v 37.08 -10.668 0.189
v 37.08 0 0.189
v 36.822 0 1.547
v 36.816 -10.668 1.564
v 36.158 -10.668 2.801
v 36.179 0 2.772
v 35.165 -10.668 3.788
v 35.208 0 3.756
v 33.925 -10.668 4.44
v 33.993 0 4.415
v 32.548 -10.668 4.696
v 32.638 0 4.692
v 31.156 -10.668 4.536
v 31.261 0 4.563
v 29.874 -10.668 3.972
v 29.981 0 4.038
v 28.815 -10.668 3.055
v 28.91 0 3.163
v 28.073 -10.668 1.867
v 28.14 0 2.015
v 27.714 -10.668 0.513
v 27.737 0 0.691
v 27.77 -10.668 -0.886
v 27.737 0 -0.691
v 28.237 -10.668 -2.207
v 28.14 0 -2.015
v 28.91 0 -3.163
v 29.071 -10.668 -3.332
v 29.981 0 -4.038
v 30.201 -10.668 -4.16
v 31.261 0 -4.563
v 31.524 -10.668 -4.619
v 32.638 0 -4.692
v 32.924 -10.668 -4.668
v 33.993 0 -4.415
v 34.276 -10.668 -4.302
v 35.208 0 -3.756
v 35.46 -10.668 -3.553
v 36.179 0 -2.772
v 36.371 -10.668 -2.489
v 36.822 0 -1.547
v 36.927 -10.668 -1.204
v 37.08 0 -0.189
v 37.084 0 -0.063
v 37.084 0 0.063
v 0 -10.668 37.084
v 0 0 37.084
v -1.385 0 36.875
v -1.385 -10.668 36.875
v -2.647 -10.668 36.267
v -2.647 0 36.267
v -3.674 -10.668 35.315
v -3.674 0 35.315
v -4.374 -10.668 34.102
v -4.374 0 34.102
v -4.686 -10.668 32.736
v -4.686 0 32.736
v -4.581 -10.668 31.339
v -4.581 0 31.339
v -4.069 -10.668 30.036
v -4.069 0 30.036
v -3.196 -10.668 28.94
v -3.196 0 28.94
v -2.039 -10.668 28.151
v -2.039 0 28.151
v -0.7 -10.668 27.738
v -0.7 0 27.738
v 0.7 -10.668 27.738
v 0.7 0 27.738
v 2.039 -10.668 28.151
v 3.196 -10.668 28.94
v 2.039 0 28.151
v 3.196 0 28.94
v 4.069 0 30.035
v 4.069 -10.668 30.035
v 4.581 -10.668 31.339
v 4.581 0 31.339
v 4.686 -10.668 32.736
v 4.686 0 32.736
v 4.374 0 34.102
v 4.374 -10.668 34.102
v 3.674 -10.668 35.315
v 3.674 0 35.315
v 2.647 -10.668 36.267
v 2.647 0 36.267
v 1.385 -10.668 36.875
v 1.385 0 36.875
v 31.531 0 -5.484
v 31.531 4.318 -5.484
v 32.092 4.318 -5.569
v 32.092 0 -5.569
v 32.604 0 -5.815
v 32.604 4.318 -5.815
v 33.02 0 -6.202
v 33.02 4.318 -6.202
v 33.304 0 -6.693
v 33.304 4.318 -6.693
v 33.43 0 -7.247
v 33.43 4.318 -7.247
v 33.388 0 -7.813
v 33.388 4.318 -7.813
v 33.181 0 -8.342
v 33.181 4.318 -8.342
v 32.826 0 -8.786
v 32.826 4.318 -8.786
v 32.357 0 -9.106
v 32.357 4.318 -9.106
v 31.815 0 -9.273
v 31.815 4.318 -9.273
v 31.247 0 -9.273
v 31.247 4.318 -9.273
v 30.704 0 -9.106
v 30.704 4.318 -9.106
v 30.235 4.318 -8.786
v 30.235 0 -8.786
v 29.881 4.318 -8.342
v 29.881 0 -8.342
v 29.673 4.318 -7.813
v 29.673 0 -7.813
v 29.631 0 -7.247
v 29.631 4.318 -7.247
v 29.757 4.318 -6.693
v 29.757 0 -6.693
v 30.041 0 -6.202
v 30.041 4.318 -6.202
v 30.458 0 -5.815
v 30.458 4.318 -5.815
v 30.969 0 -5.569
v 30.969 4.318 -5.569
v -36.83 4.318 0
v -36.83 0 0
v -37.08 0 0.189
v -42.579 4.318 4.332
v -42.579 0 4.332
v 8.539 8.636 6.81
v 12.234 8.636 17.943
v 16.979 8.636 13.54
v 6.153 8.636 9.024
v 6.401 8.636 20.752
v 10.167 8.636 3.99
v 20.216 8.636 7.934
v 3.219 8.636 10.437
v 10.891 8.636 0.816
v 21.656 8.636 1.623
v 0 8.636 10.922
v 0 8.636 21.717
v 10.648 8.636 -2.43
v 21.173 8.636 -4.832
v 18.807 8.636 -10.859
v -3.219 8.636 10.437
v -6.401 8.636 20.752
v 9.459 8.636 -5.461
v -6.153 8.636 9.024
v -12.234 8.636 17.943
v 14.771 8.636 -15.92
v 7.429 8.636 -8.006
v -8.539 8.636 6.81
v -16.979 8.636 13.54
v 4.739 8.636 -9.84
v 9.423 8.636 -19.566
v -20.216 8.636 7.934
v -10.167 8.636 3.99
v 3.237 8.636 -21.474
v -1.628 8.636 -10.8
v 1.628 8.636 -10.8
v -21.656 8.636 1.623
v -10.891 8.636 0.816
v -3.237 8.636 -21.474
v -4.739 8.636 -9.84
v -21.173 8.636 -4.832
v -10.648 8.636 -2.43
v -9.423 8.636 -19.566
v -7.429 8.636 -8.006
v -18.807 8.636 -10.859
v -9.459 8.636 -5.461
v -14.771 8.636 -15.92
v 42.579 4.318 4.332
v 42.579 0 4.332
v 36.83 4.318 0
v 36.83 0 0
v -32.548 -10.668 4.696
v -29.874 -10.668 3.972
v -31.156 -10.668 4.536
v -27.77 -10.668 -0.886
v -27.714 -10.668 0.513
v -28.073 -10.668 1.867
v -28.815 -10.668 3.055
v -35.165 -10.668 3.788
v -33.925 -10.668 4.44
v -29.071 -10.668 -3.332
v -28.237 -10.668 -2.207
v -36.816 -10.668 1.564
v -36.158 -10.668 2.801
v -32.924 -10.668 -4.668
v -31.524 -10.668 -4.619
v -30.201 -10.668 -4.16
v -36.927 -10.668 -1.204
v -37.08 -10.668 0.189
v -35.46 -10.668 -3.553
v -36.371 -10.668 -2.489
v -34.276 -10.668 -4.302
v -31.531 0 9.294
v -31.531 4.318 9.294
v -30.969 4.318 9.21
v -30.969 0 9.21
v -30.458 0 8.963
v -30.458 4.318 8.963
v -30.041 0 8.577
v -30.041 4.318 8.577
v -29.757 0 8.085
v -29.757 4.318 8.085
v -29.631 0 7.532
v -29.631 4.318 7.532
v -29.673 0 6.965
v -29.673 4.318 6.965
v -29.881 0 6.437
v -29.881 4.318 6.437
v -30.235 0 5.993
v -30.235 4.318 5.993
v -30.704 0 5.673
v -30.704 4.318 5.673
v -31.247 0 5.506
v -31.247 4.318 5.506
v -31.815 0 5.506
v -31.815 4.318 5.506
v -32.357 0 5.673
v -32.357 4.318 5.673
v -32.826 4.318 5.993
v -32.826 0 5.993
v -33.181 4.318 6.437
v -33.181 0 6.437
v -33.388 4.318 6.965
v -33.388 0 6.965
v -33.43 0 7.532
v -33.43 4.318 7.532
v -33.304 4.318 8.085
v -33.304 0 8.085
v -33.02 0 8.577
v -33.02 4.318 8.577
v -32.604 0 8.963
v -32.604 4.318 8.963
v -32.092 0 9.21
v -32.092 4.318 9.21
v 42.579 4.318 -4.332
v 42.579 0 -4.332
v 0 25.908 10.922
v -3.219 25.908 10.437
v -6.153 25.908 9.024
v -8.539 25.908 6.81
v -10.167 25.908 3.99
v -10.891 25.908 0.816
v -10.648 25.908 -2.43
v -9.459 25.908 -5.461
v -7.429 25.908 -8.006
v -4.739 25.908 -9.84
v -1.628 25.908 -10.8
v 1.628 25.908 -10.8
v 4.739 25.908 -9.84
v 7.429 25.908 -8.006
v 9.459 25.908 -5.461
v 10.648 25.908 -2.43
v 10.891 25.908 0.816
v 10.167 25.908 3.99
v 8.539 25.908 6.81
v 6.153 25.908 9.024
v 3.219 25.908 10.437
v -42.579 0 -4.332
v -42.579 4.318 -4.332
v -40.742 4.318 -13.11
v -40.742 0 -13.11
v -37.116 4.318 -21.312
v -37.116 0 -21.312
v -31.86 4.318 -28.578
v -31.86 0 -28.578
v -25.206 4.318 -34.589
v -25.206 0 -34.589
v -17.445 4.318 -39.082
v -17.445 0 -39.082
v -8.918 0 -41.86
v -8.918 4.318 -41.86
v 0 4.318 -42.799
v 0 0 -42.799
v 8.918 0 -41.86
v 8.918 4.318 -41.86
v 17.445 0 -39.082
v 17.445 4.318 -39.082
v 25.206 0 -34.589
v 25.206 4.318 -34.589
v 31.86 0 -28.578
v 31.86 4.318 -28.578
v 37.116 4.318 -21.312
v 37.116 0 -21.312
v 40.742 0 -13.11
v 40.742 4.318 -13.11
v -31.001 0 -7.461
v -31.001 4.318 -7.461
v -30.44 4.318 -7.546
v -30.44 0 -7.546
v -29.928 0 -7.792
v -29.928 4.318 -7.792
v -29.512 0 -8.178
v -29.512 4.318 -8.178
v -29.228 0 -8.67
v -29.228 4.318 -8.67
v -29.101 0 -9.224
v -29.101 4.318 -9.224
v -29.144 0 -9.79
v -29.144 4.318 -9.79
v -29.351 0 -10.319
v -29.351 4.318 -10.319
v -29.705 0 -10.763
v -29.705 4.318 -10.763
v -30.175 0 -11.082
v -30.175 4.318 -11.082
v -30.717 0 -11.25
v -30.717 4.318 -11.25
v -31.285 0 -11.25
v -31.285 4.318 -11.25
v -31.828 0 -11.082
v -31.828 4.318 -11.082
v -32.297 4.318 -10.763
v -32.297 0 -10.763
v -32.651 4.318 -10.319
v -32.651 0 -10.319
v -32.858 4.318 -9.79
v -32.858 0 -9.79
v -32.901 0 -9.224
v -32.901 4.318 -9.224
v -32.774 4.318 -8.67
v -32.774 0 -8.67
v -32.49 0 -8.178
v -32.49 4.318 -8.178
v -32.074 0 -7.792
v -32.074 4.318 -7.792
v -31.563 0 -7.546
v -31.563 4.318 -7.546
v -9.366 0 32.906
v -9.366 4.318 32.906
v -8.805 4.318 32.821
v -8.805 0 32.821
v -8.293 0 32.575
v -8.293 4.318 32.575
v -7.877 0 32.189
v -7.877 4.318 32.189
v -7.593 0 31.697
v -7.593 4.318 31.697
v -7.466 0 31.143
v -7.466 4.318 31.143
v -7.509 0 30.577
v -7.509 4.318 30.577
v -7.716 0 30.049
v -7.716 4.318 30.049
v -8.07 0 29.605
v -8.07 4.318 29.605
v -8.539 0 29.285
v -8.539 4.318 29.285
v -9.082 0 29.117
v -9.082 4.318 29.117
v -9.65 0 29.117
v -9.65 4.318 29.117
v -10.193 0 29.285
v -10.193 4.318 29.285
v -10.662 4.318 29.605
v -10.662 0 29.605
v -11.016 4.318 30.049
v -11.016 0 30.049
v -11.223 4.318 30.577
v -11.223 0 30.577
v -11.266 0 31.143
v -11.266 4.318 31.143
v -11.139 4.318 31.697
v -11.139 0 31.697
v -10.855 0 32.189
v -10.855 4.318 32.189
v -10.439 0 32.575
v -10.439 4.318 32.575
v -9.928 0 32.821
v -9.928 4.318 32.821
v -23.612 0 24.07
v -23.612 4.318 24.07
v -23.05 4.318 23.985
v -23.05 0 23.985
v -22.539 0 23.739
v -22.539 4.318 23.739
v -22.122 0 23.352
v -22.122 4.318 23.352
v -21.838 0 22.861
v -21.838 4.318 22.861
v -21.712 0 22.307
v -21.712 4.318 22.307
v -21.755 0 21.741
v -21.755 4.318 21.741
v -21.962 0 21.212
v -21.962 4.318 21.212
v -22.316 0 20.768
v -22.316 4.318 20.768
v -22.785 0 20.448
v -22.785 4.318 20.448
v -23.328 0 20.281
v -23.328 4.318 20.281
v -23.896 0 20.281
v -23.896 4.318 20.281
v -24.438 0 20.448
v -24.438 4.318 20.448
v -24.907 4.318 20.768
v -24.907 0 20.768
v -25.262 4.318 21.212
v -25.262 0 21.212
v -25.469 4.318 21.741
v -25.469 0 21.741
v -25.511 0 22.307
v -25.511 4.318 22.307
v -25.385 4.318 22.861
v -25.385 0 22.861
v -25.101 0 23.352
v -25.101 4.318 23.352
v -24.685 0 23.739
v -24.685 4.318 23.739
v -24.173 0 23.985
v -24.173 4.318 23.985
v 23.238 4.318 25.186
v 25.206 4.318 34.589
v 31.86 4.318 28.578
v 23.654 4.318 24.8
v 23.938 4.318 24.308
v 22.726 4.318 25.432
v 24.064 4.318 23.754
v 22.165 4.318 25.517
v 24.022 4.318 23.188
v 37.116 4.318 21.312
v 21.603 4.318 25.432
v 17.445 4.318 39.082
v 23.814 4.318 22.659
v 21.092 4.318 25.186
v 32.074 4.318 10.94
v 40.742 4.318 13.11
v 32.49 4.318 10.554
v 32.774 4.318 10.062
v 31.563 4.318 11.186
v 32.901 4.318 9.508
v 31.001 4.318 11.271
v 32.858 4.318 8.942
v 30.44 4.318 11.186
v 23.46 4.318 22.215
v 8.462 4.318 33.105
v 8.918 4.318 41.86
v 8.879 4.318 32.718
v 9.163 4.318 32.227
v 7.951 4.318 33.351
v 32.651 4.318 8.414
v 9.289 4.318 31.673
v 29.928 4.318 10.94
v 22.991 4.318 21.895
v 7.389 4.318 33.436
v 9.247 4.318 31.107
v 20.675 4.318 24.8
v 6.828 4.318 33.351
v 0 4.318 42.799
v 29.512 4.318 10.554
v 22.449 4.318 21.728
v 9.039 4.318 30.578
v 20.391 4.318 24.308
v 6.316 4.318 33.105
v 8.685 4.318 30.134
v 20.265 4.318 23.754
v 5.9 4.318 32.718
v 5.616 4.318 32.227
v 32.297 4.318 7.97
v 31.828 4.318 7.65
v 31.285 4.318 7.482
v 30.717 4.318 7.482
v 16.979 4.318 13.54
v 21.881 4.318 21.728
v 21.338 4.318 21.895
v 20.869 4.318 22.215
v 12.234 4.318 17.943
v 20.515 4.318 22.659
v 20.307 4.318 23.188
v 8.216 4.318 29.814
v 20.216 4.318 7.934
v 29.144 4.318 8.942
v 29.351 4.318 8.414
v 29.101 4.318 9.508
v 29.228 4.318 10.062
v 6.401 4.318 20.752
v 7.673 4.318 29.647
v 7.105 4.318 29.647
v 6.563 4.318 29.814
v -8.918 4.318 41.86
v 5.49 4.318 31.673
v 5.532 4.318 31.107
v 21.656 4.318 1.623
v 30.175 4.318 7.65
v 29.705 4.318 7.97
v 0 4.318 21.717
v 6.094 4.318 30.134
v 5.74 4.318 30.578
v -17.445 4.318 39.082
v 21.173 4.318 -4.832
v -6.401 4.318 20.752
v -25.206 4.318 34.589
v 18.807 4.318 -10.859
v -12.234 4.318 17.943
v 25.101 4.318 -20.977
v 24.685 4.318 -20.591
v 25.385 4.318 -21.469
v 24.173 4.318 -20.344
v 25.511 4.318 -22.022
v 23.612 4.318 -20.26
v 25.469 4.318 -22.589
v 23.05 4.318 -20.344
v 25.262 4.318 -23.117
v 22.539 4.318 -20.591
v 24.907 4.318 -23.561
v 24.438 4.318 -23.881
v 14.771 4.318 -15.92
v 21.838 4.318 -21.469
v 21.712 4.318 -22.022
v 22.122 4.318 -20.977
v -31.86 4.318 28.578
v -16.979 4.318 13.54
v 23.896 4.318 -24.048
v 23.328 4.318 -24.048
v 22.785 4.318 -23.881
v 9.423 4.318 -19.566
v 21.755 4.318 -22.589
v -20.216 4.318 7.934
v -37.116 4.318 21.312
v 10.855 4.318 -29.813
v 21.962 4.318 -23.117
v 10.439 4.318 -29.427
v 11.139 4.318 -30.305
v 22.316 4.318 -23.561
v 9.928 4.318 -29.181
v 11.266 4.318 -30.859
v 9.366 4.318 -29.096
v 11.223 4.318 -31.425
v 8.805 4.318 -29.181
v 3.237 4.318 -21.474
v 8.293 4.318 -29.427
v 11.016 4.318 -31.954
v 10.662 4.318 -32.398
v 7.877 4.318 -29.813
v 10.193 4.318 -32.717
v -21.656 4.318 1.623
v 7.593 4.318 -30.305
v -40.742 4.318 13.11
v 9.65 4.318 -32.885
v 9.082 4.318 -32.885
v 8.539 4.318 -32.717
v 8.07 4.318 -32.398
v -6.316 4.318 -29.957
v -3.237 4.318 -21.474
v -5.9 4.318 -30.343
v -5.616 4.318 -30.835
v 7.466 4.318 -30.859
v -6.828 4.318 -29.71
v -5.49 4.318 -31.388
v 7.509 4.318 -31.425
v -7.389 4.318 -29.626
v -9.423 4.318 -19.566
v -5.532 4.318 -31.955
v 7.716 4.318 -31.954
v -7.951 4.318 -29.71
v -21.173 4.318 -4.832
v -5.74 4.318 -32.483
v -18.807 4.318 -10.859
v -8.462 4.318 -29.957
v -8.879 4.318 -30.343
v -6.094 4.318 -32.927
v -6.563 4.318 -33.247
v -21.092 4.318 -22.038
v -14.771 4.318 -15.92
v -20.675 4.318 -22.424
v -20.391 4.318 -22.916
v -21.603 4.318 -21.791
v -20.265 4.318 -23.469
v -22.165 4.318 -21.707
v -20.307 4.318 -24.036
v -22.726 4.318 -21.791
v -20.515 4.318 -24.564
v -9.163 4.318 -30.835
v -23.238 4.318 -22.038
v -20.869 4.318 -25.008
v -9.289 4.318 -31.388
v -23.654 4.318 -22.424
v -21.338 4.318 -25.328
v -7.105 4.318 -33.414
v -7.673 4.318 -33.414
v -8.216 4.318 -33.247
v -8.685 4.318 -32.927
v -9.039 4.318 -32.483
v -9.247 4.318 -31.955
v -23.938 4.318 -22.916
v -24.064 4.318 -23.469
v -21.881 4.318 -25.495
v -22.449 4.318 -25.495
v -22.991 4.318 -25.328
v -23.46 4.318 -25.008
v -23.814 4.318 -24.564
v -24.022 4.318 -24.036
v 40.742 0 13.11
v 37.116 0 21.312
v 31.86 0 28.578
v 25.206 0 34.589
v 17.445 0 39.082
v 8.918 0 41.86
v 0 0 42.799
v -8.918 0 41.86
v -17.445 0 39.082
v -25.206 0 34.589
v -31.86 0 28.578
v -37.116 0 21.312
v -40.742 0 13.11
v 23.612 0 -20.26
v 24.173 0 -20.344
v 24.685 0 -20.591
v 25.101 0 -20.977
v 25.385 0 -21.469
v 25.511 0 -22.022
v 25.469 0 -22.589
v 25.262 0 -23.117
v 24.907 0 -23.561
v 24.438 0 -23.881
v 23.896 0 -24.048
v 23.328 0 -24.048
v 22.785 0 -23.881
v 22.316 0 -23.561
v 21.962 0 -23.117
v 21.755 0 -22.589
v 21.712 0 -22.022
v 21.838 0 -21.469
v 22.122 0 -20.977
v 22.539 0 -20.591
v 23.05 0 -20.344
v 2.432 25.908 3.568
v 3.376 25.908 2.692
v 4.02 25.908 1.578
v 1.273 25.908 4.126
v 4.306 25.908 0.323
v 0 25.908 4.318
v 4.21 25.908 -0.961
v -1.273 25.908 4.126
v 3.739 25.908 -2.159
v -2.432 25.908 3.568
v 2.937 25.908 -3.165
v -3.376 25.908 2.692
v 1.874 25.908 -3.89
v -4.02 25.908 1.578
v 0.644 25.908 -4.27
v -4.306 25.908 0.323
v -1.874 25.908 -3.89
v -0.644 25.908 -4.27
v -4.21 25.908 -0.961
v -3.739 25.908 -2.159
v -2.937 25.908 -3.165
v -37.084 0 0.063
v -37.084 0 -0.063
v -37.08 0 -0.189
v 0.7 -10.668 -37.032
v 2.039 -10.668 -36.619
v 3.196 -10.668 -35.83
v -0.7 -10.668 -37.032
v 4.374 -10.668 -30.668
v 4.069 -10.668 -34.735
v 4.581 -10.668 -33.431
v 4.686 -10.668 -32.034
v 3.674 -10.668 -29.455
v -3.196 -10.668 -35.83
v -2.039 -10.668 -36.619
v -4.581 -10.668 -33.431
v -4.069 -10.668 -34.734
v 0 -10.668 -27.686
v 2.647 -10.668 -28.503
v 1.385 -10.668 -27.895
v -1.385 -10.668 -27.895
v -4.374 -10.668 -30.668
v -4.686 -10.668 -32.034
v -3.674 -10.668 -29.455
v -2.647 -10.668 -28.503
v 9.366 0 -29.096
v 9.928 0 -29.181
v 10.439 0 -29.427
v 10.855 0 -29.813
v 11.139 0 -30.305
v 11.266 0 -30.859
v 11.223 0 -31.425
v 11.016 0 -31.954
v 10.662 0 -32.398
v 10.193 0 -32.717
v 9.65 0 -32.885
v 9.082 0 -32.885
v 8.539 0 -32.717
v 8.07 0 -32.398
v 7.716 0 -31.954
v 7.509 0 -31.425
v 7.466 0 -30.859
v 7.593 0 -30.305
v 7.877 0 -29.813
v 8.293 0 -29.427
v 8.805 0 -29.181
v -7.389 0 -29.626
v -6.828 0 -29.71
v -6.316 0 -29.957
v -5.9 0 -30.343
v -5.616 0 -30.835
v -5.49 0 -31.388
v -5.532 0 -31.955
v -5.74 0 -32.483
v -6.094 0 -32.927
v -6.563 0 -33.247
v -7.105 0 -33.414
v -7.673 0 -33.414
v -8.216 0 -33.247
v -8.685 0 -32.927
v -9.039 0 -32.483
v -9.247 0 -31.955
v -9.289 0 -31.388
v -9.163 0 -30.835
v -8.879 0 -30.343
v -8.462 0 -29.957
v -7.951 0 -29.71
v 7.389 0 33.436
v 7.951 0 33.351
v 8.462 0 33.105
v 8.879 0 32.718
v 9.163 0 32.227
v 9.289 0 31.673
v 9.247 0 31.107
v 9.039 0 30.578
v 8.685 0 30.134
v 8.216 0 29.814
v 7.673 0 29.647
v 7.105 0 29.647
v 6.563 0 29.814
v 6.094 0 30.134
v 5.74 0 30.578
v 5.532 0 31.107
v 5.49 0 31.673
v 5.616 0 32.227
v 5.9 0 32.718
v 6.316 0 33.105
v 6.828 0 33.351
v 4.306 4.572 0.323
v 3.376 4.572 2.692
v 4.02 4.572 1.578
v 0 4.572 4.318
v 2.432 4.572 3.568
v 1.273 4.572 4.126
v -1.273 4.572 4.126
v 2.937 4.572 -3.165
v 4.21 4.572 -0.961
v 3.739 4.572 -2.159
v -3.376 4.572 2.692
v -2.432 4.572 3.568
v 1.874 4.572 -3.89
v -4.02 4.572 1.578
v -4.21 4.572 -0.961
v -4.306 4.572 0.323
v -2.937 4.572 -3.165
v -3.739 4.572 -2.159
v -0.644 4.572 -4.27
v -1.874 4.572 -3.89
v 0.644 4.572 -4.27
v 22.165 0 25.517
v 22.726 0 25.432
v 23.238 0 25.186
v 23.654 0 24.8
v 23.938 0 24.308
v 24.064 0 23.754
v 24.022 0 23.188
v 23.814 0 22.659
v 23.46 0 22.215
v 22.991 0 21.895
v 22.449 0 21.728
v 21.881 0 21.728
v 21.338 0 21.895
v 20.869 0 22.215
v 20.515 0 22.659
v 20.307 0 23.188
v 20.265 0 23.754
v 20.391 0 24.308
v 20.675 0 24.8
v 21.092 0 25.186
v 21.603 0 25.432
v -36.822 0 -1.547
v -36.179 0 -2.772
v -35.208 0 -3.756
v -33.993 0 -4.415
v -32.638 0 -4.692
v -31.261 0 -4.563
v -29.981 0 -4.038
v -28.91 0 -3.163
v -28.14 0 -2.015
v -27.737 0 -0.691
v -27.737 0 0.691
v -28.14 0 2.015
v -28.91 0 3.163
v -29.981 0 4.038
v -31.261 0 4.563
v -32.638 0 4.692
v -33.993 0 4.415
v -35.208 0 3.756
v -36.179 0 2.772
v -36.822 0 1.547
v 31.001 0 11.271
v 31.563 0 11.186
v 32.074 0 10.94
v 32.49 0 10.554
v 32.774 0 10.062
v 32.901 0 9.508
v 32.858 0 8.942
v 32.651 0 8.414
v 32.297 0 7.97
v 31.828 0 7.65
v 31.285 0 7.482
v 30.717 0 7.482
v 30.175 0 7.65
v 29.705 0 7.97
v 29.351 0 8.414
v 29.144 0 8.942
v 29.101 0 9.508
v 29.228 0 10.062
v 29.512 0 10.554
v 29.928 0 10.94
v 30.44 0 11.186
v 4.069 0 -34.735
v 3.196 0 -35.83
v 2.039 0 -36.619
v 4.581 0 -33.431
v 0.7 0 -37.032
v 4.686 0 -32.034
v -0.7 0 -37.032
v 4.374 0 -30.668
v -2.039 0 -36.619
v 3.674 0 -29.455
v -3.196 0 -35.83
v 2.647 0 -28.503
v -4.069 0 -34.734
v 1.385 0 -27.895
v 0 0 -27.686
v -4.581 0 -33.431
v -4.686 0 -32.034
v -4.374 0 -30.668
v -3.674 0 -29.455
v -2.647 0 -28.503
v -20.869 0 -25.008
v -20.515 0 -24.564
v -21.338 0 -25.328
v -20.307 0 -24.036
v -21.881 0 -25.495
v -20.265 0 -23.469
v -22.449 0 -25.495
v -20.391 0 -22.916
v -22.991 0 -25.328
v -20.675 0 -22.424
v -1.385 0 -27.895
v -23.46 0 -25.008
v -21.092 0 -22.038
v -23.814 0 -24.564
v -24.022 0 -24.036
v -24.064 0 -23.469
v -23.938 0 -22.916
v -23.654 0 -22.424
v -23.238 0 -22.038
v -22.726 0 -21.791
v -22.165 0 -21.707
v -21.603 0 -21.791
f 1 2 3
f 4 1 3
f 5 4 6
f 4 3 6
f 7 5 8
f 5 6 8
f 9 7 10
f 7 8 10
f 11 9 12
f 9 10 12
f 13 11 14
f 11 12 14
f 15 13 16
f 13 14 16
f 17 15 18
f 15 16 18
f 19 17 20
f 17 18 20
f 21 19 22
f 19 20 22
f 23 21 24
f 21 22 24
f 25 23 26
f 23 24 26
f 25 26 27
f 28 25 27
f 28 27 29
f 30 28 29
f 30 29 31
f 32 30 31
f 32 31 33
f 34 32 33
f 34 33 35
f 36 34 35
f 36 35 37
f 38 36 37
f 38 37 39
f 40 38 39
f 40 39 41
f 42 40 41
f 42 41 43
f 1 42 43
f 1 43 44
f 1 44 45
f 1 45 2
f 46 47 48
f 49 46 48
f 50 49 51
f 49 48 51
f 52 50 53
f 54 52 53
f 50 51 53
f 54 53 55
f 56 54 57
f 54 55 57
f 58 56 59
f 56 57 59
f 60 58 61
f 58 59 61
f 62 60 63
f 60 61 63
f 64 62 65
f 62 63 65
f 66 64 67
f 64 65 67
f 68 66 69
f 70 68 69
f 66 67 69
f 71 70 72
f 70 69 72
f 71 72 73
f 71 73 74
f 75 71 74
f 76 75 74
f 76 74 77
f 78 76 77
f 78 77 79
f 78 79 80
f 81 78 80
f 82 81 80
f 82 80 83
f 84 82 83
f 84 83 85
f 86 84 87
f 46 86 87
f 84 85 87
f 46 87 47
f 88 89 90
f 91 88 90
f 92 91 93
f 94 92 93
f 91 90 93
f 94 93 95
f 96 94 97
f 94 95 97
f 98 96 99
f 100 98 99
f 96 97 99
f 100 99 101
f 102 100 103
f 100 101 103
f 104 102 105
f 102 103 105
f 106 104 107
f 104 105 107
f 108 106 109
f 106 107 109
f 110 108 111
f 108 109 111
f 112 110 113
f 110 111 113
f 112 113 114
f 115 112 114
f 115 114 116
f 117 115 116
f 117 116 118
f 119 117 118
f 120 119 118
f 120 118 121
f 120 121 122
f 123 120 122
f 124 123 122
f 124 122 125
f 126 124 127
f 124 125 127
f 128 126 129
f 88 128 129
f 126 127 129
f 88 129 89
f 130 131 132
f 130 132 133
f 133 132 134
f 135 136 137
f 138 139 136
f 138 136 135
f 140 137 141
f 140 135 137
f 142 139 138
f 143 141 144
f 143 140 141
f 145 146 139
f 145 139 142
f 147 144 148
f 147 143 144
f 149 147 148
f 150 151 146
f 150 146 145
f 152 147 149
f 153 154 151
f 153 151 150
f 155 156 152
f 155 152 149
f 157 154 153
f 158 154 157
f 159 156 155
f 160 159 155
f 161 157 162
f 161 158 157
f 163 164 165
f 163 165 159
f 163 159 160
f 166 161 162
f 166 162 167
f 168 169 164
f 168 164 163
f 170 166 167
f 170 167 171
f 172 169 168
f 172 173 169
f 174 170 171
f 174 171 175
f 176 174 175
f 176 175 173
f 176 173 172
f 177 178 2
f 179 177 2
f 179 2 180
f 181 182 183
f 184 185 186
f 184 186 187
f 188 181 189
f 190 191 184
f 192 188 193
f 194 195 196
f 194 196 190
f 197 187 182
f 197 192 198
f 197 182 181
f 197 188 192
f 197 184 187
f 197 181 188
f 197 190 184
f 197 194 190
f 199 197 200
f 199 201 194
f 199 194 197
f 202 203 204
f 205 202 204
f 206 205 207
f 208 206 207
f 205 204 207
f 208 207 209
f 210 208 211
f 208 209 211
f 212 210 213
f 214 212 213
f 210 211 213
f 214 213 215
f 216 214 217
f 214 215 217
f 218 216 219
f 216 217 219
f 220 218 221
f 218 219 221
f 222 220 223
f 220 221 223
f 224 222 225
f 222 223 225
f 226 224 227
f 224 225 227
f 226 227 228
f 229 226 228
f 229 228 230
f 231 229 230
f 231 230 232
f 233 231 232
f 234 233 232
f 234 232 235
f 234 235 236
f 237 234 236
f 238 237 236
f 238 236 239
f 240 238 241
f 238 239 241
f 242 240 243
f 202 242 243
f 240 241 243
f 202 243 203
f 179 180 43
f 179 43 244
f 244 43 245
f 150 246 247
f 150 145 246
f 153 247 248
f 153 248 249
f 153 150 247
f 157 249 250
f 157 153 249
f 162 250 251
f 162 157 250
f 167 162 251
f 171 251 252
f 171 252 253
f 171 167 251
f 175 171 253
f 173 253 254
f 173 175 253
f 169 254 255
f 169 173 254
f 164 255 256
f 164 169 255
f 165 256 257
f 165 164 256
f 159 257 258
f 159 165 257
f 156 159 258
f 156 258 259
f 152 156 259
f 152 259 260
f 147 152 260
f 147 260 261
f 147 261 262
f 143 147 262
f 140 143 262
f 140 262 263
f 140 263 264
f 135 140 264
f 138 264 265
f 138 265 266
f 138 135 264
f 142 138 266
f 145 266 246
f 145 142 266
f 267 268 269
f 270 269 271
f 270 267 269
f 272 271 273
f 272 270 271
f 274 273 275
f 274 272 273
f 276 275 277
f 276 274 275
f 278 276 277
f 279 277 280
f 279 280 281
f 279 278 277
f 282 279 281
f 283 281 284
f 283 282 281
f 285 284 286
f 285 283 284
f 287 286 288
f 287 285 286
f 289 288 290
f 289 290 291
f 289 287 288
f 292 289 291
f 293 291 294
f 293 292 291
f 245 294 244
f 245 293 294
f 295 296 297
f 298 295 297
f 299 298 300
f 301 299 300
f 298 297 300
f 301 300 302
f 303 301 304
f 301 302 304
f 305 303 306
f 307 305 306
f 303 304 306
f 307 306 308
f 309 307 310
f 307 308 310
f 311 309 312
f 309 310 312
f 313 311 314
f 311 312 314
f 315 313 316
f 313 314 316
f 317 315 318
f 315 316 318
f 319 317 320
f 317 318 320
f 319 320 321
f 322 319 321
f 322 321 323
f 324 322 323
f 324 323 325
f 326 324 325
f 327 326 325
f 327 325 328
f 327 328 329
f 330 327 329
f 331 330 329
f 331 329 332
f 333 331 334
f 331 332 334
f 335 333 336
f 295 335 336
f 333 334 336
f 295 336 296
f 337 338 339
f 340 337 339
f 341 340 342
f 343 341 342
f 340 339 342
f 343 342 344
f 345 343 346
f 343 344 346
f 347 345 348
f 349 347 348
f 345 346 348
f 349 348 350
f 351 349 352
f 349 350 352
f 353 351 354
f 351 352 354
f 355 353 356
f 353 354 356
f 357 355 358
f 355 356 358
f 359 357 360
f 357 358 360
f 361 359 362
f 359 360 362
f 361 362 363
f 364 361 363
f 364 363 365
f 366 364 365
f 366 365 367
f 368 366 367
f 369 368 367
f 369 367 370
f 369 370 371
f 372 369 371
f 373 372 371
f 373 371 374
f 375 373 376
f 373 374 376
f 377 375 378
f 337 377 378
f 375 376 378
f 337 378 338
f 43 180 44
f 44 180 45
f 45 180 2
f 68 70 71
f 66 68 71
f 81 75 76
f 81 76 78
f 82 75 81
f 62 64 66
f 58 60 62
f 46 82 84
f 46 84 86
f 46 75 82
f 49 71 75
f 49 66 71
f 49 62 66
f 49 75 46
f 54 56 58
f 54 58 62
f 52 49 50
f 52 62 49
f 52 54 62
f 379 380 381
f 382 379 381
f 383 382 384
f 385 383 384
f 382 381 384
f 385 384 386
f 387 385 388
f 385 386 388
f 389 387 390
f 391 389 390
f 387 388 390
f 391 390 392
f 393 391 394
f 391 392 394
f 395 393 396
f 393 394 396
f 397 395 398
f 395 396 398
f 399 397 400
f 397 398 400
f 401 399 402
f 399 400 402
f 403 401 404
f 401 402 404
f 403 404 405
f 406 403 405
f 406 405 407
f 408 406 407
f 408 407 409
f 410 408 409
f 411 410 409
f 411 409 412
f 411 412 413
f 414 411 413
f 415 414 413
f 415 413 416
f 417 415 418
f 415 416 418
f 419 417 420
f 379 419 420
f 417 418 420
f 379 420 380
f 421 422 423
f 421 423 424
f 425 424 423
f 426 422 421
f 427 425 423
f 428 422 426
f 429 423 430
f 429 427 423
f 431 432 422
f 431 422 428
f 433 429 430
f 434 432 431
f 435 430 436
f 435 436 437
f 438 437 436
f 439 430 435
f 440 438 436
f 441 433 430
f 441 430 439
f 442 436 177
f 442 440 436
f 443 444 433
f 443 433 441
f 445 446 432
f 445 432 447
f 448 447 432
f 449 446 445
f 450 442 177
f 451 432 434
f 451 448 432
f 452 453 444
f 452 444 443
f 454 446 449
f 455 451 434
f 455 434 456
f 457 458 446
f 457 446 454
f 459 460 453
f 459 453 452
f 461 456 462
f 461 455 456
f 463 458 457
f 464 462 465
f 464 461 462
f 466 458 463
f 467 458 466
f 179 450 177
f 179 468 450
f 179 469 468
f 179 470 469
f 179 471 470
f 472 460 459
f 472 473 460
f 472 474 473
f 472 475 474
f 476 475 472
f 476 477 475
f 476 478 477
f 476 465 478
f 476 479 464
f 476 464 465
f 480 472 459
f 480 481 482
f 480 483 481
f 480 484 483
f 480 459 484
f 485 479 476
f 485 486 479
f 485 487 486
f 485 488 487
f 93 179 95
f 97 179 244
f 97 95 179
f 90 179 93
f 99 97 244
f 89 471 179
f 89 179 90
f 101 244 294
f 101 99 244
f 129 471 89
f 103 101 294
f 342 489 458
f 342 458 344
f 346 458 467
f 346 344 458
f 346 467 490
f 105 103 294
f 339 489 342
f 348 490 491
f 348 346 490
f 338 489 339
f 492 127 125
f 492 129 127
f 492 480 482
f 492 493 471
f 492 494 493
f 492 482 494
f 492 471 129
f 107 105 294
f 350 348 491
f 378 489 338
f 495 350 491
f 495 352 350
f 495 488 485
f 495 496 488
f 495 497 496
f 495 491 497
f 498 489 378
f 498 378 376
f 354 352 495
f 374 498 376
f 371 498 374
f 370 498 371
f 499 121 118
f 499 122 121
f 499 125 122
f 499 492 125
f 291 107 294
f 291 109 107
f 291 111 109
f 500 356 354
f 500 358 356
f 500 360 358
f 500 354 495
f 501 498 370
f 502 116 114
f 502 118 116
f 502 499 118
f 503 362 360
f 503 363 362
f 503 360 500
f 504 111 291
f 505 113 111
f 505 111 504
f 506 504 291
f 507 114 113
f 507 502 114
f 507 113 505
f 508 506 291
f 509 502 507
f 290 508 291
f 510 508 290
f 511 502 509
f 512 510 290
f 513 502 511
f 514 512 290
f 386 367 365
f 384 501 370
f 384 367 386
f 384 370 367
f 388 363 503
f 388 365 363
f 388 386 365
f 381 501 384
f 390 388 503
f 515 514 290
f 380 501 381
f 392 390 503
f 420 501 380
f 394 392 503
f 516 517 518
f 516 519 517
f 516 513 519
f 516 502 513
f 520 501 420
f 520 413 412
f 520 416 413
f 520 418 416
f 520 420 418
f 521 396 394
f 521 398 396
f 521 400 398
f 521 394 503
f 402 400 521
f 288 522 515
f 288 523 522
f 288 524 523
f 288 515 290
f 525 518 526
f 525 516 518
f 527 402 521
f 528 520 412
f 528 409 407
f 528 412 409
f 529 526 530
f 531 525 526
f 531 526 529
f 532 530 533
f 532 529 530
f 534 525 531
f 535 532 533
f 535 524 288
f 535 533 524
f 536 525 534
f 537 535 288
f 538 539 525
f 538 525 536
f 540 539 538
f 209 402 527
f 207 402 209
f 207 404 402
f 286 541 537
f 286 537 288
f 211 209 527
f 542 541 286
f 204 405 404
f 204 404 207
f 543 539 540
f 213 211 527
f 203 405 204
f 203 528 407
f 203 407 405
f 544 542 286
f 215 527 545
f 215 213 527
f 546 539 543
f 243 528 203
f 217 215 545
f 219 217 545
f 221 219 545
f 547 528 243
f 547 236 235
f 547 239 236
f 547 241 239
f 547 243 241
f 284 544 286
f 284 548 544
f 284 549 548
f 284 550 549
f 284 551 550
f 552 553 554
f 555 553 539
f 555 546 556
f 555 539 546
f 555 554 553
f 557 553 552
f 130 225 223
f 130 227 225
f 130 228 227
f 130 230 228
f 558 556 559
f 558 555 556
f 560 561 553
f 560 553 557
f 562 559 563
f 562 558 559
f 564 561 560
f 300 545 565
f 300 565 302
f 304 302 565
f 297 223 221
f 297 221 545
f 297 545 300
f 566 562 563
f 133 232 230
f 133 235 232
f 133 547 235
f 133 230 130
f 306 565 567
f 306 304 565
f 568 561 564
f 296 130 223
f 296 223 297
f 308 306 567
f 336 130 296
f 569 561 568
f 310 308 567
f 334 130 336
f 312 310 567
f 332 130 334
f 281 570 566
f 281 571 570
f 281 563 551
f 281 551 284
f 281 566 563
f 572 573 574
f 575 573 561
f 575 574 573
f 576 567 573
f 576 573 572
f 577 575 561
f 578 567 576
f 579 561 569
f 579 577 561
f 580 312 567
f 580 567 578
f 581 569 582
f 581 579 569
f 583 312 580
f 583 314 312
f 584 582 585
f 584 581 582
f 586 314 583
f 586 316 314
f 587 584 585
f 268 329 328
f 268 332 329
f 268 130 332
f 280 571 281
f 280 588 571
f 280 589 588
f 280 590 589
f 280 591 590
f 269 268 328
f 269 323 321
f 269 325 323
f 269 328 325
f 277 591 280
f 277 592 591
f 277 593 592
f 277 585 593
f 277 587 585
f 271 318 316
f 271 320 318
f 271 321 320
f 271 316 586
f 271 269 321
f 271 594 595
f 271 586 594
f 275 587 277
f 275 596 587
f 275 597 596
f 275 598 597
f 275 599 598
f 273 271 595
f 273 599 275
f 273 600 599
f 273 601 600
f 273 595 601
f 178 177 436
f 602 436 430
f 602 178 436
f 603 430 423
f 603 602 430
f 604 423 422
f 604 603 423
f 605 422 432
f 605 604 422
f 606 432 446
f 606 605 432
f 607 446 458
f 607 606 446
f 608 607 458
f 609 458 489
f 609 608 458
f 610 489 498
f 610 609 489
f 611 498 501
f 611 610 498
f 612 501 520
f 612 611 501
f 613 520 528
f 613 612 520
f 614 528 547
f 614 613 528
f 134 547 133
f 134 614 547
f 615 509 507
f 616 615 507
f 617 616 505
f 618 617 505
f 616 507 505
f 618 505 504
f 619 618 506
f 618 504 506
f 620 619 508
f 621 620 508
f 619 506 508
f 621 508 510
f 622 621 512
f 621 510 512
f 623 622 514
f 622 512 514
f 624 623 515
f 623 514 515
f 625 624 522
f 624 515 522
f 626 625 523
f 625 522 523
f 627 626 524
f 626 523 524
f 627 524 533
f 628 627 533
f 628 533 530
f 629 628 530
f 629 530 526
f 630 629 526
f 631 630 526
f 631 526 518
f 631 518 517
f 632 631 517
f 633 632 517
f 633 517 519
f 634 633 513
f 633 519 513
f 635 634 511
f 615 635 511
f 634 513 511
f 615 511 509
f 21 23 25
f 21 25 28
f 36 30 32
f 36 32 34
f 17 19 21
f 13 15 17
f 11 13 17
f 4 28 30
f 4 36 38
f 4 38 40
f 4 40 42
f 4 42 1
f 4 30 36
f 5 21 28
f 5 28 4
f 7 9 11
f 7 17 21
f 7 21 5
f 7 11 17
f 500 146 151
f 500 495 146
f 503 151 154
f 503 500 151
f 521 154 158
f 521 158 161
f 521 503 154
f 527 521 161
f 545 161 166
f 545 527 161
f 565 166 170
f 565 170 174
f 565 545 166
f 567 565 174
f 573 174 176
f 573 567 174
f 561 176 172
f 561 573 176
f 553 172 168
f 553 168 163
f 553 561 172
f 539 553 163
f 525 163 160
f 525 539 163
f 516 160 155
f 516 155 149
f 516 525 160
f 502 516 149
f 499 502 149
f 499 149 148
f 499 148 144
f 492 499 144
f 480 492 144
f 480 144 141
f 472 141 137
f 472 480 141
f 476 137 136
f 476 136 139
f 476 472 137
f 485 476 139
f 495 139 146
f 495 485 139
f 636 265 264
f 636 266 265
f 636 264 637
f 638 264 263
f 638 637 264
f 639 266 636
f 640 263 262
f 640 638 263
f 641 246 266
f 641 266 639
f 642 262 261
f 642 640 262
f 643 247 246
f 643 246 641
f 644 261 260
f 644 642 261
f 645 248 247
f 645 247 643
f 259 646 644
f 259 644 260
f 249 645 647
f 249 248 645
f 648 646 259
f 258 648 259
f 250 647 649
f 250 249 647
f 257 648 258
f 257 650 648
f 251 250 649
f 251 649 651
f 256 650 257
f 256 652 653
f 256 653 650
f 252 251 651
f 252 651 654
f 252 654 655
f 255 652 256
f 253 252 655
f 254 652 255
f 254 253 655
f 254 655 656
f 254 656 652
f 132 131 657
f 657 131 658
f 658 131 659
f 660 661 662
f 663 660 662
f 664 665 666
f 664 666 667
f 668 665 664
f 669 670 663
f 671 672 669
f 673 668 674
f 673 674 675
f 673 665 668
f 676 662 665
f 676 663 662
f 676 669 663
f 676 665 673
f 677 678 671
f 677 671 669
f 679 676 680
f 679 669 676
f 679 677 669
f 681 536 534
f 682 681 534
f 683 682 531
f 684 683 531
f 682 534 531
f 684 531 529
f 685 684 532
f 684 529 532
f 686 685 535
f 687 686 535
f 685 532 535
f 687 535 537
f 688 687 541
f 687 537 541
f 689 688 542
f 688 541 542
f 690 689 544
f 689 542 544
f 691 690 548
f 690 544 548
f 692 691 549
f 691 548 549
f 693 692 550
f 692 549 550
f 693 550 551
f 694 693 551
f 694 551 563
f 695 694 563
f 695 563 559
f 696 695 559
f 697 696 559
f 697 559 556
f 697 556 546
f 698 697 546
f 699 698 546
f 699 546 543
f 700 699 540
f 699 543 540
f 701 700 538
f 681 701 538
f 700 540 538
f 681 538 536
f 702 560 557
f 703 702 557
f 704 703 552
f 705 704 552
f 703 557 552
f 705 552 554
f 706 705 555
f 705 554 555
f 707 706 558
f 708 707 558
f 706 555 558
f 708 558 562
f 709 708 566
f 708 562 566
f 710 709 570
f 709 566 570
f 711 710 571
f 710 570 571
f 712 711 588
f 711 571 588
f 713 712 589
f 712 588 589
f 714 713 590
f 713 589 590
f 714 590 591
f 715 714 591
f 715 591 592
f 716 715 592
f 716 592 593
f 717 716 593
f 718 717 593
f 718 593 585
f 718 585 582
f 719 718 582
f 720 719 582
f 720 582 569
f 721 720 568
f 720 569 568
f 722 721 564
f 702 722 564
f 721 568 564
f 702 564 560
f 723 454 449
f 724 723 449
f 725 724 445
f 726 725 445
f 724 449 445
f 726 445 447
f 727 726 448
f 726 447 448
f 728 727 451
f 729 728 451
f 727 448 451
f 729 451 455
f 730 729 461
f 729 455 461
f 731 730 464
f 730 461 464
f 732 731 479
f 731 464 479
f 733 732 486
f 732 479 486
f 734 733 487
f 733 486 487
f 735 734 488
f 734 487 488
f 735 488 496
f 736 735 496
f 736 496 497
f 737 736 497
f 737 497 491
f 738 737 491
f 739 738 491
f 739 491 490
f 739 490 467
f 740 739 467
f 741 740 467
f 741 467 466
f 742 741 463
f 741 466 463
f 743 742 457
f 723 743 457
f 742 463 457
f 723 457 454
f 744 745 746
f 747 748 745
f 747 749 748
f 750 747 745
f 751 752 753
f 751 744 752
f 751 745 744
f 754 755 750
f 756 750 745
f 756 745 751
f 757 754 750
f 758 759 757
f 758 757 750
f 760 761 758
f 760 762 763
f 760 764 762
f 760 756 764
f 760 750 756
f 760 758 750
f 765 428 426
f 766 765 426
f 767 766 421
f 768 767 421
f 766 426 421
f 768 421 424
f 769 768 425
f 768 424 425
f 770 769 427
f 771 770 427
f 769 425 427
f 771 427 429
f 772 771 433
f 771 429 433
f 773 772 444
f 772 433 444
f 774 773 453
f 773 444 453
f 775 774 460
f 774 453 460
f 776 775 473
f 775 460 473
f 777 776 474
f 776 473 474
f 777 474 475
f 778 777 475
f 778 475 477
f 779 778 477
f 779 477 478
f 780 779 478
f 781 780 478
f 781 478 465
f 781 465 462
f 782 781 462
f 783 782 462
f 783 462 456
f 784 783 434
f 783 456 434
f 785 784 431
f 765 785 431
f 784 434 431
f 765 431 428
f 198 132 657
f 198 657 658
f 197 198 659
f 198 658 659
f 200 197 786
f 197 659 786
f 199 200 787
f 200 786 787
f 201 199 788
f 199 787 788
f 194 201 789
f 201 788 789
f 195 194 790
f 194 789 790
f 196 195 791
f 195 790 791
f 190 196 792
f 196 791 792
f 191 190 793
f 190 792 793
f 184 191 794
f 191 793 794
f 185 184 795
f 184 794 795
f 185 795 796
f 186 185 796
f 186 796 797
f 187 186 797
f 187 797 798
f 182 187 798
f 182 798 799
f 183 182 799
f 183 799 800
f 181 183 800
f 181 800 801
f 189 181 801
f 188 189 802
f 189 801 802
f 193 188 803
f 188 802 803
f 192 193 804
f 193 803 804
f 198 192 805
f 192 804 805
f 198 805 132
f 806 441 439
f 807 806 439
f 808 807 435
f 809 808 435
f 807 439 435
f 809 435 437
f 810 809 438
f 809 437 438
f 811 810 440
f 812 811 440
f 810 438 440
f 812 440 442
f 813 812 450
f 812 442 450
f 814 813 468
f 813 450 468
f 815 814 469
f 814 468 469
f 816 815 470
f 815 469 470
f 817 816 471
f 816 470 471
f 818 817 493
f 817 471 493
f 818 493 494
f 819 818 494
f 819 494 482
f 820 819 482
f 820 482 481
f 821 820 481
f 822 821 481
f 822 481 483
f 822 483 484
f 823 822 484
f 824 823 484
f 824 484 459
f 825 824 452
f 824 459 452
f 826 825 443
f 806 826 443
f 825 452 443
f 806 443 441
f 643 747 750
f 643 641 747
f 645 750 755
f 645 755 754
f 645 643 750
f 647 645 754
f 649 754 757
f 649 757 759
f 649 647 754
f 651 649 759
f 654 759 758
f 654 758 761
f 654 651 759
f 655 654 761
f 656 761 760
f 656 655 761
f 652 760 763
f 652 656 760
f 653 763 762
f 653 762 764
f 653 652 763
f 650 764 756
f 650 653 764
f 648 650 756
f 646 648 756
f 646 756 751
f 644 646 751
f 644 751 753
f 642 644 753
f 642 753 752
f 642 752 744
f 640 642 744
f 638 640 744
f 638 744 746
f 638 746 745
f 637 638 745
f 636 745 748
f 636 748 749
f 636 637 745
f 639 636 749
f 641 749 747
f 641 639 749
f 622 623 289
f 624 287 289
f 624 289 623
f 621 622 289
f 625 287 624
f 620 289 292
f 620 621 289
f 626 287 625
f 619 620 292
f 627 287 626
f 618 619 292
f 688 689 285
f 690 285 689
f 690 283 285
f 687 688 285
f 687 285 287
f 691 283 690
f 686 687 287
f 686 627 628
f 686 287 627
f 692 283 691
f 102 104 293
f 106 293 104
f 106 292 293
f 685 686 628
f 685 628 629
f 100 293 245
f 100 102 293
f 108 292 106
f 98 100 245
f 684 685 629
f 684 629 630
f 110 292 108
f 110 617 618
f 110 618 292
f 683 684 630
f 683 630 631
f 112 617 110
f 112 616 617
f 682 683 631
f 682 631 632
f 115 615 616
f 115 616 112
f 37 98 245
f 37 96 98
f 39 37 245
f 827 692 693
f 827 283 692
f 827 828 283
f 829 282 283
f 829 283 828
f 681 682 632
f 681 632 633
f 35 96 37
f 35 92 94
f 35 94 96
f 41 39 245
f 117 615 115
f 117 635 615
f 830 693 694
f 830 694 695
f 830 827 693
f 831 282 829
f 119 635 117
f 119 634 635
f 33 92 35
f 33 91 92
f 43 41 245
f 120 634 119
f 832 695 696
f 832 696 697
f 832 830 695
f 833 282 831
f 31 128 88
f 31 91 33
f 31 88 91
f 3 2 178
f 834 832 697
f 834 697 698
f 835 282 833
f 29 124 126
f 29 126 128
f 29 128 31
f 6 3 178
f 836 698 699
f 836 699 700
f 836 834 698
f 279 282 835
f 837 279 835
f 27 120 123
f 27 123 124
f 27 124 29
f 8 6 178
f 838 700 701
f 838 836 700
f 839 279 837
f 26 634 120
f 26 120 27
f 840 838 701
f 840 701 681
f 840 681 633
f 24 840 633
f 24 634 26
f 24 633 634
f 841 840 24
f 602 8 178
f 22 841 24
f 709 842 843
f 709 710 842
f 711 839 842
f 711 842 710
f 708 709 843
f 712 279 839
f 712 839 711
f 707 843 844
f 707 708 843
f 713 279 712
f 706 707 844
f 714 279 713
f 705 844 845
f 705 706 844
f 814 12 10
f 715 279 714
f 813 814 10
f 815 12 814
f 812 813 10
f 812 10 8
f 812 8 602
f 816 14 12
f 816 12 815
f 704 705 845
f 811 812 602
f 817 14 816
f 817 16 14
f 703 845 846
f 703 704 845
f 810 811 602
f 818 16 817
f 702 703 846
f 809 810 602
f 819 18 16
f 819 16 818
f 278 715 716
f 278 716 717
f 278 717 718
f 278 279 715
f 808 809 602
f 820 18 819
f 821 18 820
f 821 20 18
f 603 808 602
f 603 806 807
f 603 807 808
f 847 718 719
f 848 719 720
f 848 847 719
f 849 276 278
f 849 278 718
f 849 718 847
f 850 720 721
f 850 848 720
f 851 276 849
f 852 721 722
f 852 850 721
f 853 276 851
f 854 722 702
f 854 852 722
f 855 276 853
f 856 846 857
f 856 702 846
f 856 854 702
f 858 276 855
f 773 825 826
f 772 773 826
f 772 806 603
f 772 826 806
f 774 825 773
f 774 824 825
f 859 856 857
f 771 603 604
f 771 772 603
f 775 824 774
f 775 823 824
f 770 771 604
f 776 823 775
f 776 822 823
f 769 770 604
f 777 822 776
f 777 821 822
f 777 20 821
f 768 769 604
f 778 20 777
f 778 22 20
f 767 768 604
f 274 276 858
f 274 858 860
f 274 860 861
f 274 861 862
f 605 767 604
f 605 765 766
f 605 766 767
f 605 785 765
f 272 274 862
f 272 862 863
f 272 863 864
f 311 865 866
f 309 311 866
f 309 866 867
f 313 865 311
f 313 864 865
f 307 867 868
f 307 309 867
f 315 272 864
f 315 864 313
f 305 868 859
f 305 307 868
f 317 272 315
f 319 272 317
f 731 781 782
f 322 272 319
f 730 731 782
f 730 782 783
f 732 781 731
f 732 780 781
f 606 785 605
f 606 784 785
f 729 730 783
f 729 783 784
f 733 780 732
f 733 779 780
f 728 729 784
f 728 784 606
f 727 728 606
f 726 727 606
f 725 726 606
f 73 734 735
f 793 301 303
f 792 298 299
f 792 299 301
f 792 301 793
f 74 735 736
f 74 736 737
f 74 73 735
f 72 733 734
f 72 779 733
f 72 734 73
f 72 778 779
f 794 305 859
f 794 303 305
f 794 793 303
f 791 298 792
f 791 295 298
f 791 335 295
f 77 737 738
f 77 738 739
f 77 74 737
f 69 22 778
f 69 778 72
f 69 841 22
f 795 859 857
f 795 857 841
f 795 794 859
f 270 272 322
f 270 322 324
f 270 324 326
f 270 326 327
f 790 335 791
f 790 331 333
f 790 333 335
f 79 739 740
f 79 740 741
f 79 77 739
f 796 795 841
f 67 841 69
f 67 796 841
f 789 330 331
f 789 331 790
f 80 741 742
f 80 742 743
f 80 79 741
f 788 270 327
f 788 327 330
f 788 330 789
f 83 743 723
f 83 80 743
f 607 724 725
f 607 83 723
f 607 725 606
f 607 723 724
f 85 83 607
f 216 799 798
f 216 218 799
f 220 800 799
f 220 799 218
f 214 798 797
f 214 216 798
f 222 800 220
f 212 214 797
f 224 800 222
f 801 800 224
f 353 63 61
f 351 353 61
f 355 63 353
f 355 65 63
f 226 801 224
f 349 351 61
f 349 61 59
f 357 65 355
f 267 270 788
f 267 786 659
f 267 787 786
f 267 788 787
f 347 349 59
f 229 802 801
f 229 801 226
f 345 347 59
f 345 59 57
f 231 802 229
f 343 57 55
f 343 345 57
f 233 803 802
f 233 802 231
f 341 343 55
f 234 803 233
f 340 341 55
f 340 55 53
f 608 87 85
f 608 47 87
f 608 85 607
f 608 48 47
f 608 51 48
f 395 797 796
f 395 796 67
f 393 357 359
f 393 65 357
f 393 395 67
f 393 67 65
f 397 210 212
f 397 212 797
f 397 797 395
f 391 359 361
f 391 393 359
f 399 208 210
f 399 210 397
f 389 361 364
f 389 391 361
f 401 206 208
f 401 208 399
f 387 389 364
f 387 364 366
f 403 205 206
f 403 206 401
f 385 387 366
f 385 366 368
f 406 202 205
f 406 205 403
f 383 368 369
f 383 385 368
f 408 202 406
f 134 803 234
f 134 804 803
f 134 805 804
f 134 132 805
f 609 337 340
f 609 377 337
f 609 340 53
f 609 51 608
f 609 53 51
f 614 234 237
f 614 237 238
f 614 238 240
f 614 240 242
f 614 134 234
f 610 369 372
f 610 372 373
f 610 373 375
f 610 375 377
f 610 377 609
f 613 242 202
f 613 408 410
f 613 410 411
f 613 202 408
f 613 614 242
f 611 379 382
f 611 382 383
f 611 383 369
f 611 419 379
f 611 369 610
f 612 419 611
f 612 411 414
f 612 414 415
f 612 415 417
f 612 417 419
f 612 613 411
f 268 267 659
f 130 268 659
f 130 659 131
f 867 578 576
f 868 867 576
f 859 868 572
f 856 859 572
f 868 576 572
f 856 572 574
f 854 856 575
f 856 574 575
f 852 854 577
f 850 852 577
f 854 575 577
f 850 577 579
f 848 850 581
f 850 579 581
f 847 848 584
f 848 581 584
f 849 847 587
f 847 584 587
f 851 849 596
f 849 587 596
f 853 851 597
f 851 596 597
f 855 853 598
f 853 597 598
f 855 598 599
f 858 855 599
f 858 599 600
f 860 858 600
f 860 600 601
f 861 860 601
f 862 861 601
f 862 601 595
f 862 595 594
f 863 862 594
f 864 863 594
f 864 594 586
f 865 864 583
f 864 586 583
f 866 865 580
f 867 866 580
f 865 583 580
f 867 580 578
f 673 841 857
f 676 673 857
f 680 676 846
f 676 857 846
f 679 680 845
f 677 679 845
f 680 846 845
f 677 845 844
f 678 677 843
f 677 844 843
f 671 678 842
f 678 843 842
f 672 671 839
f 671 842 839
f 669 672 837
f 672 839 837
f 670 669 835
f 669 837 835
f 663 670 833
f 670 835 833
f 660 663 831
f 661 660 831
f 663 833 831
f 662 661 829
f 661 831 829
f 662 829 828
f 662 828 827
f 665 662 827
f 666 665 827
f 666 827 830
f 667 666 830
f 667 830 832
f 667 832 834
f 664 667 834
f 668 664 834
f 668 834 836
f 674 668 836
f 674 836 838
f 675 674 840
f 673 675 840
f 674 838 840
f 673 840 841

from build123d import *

# Parameters (mm, degrees)
SKETCH2_R           = 1.905
CUT_EXTRUDE1_DEPTH  = 4.318
CUT_EXTRUDE2_DEPTH  = 66.838691254
SKETCH4_R           = 4.699
BOSS_EXTRUDE1_DEPTH = 10.668


with BuildPart() as part:
    # Sketch1 → Revolve1 (revolve)
    with BuildSketch(Plane.XY, mode=Mode.PRIVATE) as revolve1_sk:
        Polygon((-42.799, 0), (0, 0), (0, 4.572), (-4.318, 4.572), (-4.318, 25.908), (-10.922, 25.908), (-10.922, 8.636), (-21.717, 8.636), (-21.717, 4.318), (-42.799, 4.318), align=None)
    revolve(revolve1_sk.sketch.rotate(Axis((0, 25.908, 0), (0, -1, 0)), 270), axis=Axis((0, 25.908, 0), (0, -1, 0)))

    # Sketch2 → Cut-Extrude1 (cut)
    with BuildSketch(Plane(origin=(0, 4.318, 0), x_dir=(1, 0, 0), z_dir=(0, 1, 0))):
        with Locations(Location((-31.001055742, 9.366043342, 0), (0, 0, 270))):
            Circle(SKETCH2_R)
        with Locations(Location((-22.164680145, 23.611759338, 0), (0, 0, 270))):
            Circle(SKETCH2_R)
        with Locations(Location((-7.389296403, 31.530723488, 0), (0, 0, 270))):
            Circle(SKETCH2_R)
        with Locations(Location((9.366043342, 31.001055742, 0), (0, 0, 270))):
            Circle(SKETCH2_R)
        with Locations(Location((23.611759338, 22.164680145, 0), (0, 0, 270))):
            Circle(SKETCH2_R)
        with Locations(Location((31.530723488, 7.389296403, 0), (0, 0, 270))):
            Circle(SKETCH2_R)
        with Locations(Location((31.001055742, -9.366043342, 0), (0, 0, 270))):
            Circle(SKETCH2_R)
        with Locations(Location((22.164680145, -23.611759338, 0), (0, 0, 270))):
            Circle(SKETCH2_R)
        with Locations(Location((7.389296403, -31.530723488, 0), (0, 0, 270))):
            Circle(SKETCH2_R)
        with Locations(Location((-9.366043342, -31.001055742, 0), (0, 0, 270))):
            Circle(SKETCH2_R)
        with Locations(Location((-23.611759338, -22.164680145, 0), (0, 0, 270))):
            Circle(SKETCH2_R)
        with Locations(Location((-31.530723488, -7.389296403, 0), (0, 0, 270))):
            Circle(SKETCH2_R)
    extrude(amount=-CUT_EXTRUDE1_DEPTH, mode=Mode.SUBTRACT)

    # Sketch3 → Cut-Extrude2 (cut, through all)
    with BuildSketch(Plane.XZ):
        with BuildLine():
            ThreePointArc((42.799, 0), (42.744006542, 2.168941149), (42.579167494, 4.33230845))
            Line((42.579167494, 4.33230845), (36.83, 0))
            Line((36.83, 0), (42.579167494, -4.33230845))
            ThreePointArc((42.579167494, -4.33230845), (42.744006542, -2.168941149), (42.799, 0))
        make_face()
        with BuildLine():
            Line((-36.83, 0), (-42.579167494, 4.33230845))
            ThreePointArc((-42.579167494, 4.33230845), (-42.799, 0), (-42.579167494, -4.33230845))
            Line((-42.579167494, -4.33230845), (-36.83, 0))
        make_face()
    extrude(amount=-CUT_EXTRUDE2_DEPTH, mode=Mode.SUBTRACT)

    # Sketch4 → Boss-Extrude1 (add)
    with BuildSketch(Plane.XZ):
        with Locations(Location((0, 32.385, 0), (0, 0, 90))):
            Circle(SKETCH4_R)
        with Locations(Location((32.385, 0, 0), (0, 0, 2.299654478))):
            Circle(SKETCH4_R)
        with Locations(Location((0, -32.385, 0), (0, 0, 90))):
            Circle(SKETCH4_R)
        with Locations(Location((-32.385, 0, 0), (0, 0, 177.700345522))):
            Circle(SKETCH4_R)
    extrude(amount=BOSS_EXTRUDE1_DEPTH)


solid = part.part
